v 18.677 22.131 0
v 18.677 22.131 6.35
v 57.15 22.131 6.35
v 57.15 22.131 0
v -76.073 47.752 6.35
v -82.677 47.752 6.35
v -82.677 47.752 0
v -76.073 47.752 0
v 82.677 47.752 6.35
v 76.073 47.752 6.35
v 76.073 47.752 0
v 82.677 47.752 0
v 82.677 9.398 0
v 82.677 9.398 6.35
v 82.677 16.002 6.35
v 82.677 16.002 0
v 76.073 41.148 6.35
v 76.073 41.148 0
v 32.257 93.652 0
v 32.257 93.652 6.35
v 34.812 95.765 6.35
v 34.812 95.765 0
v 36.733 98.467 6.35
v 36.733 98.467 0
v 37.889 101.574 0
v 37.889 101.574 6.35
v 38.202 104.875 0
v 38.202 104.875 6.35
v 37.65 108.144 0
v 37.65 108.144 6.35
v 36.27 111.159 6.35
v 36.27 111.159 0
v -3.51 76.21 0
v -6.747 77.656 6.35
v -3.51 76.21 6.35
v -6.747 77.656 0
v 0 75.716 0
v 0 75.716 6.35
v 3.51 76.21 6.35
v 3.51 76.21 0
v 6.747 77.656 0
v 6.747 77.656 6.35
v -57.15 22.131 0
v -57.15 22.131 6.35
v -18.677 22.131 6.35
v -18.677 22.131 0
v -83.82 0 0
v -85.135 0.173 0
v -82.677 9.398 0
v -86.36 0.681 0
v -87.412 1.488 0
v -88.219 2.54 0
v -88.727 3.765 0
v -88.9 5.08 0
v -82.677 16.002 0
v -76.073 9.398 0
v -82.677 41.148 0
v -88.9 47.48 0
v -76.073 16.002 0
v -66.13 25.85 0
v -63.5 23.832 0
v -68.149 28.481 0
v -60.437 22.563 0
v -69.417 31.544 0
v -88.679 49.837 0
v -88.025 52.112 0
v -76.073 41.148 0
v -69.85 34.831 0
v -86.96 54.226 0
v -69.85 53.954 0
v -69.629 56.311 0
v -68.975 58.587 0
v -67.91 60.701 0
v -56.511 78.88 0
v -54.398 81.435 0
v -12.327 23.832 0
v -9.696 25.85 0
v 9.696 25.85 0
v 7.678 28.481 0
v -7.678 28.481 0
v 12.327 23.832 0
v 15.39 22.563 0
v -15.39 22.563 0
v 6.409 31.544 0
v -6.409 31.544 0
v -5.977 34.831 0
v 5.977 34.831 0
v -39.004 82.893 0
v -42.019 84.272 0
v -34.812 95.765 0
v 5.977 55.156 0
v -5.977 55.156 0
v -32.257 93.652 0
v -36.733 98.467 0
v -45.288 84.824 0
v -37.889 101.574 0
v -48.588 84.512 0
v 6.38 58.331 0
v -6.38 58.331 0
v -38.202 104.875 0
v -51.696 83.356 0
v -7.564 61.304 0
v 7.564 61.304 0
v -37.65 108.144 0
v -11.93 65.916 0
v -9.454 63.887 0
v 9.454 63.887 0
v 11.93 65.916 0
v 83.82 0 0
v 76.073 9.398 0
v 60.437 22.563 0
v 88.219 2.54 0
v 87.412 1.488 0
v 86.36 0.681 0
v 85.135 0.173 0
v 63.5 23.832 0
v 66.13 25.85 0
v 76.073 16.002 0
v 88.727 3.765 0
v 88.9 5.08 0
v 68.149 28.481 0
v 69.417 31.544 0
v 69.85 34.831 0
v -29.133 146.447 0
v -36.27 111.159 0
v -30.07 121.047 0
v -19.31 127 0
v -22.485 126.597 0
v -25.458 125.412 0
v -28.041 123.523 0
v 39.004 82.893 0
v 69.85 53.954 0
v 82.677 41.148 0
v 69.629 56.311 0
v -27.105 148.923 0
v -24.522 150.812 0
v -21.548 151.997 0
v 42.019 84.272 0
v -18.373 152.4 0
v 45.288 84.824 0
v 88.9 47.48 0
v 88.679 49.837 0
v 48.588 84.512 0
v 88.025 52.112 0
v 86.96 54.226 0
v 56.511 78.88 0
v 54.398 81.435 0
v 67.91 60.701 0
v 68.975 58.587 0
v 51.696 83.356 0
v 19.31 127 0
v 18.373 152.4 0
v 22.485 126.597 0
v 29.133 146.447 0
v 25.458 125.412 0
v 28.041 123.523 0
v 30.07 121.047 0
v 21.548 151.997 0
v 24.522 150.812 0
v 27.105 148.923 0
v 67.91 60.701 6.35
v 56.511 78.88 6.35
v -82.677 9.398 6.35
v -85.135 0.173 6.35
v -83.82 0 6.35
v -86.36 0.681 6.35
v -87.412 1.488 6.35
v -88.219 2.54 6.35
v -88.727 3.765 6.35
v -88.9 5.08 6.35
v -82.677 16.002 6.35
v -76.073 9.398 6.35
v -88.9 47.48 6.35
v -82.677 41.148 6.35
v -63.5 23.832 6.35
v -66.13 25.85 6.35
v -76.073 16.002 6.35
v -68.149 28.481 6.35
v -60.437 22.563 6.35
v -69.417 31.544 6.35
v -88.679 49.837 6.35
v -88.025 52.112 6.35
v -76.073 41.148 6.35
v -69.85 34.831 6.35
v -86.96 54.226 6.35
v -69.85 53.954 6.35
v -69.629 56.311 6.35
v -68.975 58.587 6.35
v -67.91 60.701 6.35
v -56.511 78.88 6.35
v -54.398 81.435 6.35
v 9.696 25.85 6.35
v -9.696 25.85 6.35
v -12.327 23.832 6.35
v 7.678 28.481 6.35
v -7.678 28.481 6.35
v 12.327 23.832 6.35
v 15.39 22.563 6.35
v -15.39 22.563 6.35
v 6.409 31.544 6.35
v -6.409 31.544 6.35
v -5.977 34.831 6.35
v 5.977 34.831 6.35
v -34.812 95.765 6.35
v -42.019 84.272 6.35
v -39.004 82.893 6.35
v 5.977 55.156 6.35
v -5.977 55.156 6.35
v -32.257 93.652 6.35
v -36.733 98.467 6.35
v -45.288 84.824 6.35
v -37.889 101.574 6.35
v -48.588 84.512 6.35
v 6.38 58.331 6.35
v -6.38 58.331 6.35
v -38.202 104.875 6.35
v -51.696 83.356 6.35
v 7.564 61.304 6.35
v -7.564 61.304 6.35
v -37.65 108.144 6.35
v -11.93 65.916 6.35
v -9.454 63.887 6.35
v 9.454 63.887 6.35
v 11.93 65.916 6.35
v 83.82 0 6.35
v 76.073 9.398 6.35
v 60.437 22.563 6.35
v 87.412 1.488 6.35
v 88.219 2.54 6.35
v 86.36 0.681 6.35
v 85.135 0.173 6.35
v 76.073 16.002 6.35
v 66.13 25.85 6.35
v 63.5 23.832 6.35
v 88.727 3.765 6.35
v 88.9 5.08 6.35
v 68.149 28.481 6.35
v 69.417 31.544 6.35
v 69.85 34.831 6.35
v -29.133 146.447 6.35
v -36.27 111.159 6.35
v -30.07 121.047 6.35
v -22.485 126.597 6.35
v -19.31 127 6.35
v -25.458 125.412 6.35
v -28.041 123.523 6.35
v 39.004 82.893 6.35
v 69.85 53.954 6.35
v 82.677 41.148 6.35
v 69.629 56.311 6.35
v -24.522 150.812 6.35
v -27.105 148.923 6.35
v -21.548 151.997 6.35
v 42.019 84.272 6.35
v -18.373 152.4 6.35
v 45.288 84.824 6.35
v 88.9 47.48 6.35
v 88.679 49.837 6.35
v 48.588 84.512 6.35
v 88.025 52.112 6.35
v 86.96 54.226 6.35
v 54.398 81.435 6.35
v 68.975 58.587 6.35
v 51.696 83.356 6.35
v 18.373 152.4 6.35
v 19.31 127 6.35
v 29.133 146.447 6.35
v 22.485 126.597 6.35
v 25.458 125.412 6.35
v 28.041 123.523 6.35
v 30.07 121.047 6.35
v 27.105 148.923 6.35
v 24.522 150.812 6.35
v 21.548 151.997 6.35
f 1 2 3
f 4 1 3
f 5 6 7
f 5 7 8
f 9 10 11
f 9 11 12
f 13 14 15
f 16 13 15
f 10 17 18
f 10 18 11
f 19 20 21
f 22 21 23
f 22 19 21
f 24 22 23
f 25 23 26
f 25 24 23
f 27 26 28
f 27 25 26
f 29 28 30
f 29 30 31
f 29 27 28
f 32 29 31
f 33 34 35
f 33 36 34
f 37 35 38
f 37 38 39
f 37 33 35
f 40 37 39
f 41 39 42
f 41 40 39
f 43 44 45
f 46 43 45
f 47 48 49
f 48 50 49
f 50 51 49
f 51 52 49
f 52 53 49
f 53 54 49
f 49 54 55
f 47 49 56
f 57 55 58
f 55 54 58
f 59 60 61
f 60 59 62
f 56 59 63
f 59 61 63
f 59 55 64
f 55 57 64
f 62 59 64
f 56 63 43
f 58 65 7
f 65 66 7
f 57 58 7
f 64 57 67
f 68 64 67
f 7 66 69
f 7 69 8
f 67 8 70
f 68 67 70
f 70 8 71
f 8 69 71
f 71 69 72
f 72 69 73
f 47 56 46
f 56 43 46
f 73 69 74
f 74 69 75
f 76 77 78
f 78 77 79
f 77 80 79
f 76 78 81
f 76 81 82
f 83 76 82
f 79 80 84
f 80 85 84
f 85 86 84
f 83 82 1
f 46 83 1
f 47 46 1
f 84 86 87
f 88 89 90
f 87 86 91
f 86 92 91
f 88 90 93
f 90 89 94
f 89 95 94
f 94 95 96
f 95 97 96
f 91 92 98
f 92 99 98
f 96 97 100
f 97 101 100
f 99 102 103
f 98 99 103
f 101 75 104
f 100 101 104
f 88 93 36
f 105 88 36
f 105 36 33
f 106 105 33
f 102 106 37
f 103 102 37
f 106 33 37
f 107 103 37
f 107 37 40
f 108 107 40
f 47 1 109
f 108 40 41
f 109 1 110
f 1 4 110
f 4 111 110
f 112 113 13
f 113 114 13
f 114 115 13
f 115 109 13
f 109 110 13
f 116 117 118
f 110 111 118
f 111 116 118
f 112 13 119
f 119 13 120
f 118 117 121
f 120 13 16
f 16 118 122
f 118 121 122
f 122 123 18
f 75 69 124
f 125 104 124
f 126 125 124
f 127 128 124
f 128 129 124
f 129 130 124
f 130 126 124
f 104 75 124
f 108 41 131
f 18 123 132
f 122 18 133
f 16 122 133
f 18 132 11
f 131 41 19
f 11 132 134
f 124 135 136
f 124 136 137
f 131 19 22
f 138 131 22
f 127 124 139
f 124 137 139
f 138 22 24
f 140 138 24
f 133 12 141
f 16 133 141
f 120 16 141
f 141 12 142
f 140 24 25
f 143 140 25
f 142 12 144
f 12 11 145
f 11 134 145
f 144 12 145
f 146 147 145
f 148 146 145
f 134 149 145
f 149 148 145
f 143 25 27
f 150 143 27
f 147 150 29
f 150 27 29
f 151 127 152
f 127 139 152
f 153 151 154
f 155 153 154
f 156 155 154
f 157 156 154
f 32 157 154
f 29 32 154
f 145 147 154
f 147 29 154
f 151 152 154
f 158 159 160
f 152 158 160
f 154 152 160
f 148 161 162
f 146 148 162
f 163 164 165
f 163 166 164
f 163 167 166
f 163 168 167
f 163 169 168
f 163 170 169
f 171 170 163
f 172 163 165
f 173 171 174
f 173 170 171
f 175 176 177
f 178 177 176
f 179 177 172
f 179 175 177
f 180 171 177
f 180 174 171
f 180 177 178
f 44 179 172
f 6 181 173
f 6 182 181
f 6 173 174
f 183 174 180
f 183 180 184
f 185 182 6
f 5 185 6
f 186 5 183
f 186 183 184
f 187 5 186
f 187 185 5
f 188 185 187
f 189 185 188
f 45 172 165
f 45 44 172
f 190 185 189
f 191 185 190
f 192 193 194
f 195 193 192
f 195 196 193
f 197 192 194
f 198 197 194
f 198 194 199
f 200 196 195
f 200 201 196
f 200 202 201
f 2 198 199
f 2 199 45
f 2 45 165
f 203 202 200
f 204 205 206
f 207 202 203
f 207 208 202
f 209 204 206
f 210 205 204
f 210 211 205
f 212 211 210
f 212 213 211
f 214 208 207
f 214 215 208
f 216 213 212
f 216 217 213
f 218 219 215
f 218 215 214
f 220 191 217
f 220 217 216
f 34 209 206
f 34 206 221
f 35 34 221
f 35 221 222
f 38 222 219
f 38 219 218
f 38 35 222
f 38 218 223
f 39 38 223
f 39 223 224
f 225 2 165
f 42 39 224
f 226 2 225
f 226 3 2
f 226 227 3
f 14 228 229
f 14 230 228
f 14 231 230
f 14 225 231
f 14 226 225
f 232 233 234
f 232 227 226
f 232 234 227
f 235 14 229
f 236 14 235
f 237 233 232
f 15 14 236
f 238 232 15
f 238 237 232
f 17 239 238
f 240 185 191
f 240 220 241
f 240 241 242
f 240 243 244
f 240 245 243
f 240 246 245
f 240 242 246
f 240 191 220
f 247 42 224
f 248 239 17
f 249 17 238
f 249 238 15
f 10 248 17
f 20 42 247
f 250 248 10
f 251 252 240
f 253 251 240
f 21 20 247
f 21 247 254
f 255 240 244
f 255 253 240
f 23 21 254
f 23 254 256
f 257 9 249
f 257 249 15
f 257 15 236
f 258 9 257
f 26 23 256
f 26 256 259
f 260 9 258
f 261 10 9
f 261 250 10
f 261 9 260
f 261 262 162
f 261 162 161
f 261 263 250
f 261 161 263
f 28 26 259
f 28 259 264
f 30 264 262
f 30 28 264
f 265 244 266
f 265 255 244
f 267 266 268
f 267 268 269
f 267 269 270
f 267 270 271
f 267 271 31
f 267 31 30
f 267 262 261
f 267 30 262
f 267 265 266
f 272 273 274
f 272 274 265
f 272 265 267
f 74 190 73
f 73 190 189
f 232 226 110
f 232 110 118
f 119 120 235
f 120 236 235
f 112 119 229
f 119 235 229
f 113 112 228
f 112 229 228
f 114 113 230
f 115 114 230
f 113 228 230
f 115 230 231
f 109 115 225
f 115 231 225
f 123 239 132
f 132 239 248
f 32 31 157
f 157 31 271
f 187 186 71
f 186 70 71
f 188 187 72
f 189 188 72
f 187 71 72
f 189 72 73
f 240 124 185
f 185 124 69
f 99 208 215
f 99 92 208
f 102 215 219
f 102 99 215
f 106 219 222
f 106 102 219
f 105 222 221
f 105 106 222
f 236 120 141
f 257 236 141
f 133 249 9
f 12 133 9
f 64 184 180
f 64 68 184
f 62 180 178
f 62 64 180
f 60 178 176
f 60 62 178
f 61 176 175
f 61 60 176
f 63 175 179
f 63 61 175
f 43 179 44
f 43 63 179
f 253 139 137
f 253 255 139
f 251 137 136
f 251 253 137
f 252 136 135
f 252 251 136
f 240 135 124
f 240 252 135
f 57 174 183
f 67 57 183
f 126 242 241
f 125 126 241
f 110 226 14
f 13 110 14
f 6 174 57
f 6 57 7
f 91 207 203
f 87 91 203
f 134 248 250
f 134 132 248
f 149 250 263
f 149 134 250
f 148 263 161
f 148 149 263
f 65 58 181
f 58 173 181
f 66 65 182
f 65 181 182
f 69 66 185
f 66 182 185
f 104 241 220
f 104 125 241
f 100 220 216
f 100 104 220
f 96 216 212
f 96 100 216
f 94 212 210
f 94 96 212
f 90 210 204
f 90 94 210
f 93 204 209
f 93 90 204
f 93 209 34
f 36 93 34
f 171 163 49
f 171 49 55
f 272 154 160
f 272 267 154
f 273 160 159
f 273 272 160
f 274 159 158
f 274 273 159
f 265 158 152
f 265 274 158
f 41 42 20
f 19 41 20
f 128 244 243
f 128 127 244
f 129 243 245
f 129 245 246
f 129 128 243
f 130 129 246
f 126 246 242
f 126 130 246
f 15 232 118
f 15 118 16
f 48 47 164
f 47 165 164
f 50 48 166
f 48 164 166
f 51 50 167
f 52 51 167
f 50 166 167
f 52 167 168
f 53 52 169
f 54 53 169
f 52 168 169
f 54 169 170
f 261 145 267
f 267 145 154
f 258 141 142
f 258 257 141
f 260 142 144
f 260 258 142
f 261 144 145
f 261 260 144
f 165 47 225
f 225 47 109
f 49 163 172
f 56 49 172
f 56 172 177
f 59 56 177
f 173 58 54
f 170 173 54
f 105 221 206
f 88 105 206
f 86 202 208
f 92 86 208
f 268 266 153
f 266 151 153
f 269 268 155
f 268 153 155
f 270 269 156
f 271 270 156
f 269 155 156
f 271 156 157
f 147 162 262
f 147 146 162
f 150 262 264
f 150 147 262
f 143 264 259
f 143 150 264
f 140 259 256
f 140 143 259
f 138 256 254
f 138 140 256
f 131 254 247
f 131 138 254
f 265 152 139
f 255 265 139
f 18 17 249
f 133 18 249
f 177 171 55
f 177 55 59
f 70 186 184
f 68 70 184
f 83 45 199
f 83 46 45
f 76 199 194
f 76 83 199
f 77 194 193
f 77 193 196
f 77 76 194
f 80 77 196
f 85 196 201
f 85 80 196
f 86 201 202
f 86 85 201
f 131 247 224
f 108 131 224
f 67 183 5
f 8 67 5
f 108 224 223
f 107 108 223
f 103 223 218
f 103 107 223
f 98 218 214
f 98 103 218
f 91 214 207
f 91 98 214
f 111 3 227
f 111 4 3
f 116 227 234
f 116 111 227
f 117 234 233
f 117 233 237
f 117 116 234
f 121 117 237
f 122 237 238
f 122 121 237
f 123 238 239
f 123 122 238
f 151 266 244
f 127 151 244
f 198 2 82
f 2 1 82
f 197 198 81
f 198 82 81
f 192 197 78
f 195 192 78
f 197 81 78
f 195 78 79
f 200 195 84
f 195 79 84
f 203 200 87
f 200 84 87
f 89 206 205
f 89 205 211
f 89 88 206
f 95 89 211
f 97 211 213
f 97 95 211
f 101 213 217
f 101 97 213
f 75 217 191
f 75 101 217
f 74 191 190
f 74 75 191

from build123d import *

# Parameters (mm, degrees)
F1_DEPTH = 6.35
F3_DEPTH = 25.4
F4_R     = 12.7
F5_R     = 12.7
F6_W     = 6.604
F6_H     = 6.604
F7_DEPTH = 25.4
F8_R     = 5.08


with BuildPart() as f1:
    # F0 (on Top) → F1 (new body)
    with BuildSketch(Plane.XY):
        Polygon((0, 0), (88.9, 0), (88.9, 51.132088), (25.4, 152.4), (0, 152.4), (-25.4, 152.4), (-88.9, 51.132088), (-88.9, 0), align=None)
    extrude(amount=F1_DEPTH)

    # F2 (on face) → F3 (cut)
    with BuildSketch(Plane.XY.offset(6.35)):
        Polygon((26.336802, 127), (0, 127), (-26.336802, 127), (-43.016926, 100.399034), (0, 73.42529), (43.016926, 100.399034), align=None)
        Polygon((-69.85, 57.606446), (-69.85, 22.130749), (-5.976504, 22.130749), (-5.976504, 62.182597), (-49.763763, 89.639379), align=None)
        Polygon((5.976504, 22.130749), (69.85, 22.130749), (69.85, 57.606446), (49.763763, 89.639379), (5.976504, 62.182597), align=None)
    extrude(amount=-F3_DEPTH, mode=Mode.SUBTRACT)

    # F4
    f4_edges = [f1.edges().sort_by_distance(p)[0] for p in [
        (-25.4, 152.4, 3.175),
        (25.4, 152.4, 3.175),
        (88.9, 51.132088, 3.175),
        (-88.9, 51.132088, 3.175),
    ]]
    fillet(f4_edges, radius=F4_R)

    # F5
    f5_edges = [f1.edges().sort_by_distance(p)[0] for p in [
        (-43.016926, 100.399034, 3.175),
        (0, 73.42529, 3.175),
        (-26.336802, 127, 3.175),
        (26.336802, 127, 3.175),
        (43.016926, 100.399034, 3.175),
        (-49.763763, 89.639379, 3.175),
        (-69.85, 57.606446, 3.175),
        (-69.85, 22.130749, 3.175),
        (-5.976504, 22.130749, 3.175),
        (-5.976504, 62.182597, 3.175),
        (49.763763, 89.639379, 3.175),
        (69.85, 57.606446, 3.175),
        (69.85, 22.130749, 3.175),
        (5.976504, 22.130749, 3.175),
        (5.976504, 62.182597, 3.175),
    ]]
    fillet(f5_edges, radius=F5_R)

    # F6 (on face) → F7 (cut)
    with BuildSketch(Plane.XY.offset(6.35)):
        with Locations((-79.375, 44.45)):
            Rectangle(F6_W, F6_H)
        with Locations((-79.375, 12.7)):
            Rectangle(F6_W, F6_H)
        with Locations((79.375, 12.7)):
            Rectangle(F6_W, F6_H)
        with Locations((79.375, 44.45)):
            Rectangle(F6_W, F6_H)
    extrude(amount=-F7_DEPTH, mode=Mode.SUBTRACT)

    # F8
    f8_edges = [f1.edges().sort_by_distance(p)[0] for p in [
        (-88.9, 0, 3.175),
        (88.9, 0, 3.175),
    ]]
    fillet(f8_edges, radius=F8_R)


solid = f1.part
